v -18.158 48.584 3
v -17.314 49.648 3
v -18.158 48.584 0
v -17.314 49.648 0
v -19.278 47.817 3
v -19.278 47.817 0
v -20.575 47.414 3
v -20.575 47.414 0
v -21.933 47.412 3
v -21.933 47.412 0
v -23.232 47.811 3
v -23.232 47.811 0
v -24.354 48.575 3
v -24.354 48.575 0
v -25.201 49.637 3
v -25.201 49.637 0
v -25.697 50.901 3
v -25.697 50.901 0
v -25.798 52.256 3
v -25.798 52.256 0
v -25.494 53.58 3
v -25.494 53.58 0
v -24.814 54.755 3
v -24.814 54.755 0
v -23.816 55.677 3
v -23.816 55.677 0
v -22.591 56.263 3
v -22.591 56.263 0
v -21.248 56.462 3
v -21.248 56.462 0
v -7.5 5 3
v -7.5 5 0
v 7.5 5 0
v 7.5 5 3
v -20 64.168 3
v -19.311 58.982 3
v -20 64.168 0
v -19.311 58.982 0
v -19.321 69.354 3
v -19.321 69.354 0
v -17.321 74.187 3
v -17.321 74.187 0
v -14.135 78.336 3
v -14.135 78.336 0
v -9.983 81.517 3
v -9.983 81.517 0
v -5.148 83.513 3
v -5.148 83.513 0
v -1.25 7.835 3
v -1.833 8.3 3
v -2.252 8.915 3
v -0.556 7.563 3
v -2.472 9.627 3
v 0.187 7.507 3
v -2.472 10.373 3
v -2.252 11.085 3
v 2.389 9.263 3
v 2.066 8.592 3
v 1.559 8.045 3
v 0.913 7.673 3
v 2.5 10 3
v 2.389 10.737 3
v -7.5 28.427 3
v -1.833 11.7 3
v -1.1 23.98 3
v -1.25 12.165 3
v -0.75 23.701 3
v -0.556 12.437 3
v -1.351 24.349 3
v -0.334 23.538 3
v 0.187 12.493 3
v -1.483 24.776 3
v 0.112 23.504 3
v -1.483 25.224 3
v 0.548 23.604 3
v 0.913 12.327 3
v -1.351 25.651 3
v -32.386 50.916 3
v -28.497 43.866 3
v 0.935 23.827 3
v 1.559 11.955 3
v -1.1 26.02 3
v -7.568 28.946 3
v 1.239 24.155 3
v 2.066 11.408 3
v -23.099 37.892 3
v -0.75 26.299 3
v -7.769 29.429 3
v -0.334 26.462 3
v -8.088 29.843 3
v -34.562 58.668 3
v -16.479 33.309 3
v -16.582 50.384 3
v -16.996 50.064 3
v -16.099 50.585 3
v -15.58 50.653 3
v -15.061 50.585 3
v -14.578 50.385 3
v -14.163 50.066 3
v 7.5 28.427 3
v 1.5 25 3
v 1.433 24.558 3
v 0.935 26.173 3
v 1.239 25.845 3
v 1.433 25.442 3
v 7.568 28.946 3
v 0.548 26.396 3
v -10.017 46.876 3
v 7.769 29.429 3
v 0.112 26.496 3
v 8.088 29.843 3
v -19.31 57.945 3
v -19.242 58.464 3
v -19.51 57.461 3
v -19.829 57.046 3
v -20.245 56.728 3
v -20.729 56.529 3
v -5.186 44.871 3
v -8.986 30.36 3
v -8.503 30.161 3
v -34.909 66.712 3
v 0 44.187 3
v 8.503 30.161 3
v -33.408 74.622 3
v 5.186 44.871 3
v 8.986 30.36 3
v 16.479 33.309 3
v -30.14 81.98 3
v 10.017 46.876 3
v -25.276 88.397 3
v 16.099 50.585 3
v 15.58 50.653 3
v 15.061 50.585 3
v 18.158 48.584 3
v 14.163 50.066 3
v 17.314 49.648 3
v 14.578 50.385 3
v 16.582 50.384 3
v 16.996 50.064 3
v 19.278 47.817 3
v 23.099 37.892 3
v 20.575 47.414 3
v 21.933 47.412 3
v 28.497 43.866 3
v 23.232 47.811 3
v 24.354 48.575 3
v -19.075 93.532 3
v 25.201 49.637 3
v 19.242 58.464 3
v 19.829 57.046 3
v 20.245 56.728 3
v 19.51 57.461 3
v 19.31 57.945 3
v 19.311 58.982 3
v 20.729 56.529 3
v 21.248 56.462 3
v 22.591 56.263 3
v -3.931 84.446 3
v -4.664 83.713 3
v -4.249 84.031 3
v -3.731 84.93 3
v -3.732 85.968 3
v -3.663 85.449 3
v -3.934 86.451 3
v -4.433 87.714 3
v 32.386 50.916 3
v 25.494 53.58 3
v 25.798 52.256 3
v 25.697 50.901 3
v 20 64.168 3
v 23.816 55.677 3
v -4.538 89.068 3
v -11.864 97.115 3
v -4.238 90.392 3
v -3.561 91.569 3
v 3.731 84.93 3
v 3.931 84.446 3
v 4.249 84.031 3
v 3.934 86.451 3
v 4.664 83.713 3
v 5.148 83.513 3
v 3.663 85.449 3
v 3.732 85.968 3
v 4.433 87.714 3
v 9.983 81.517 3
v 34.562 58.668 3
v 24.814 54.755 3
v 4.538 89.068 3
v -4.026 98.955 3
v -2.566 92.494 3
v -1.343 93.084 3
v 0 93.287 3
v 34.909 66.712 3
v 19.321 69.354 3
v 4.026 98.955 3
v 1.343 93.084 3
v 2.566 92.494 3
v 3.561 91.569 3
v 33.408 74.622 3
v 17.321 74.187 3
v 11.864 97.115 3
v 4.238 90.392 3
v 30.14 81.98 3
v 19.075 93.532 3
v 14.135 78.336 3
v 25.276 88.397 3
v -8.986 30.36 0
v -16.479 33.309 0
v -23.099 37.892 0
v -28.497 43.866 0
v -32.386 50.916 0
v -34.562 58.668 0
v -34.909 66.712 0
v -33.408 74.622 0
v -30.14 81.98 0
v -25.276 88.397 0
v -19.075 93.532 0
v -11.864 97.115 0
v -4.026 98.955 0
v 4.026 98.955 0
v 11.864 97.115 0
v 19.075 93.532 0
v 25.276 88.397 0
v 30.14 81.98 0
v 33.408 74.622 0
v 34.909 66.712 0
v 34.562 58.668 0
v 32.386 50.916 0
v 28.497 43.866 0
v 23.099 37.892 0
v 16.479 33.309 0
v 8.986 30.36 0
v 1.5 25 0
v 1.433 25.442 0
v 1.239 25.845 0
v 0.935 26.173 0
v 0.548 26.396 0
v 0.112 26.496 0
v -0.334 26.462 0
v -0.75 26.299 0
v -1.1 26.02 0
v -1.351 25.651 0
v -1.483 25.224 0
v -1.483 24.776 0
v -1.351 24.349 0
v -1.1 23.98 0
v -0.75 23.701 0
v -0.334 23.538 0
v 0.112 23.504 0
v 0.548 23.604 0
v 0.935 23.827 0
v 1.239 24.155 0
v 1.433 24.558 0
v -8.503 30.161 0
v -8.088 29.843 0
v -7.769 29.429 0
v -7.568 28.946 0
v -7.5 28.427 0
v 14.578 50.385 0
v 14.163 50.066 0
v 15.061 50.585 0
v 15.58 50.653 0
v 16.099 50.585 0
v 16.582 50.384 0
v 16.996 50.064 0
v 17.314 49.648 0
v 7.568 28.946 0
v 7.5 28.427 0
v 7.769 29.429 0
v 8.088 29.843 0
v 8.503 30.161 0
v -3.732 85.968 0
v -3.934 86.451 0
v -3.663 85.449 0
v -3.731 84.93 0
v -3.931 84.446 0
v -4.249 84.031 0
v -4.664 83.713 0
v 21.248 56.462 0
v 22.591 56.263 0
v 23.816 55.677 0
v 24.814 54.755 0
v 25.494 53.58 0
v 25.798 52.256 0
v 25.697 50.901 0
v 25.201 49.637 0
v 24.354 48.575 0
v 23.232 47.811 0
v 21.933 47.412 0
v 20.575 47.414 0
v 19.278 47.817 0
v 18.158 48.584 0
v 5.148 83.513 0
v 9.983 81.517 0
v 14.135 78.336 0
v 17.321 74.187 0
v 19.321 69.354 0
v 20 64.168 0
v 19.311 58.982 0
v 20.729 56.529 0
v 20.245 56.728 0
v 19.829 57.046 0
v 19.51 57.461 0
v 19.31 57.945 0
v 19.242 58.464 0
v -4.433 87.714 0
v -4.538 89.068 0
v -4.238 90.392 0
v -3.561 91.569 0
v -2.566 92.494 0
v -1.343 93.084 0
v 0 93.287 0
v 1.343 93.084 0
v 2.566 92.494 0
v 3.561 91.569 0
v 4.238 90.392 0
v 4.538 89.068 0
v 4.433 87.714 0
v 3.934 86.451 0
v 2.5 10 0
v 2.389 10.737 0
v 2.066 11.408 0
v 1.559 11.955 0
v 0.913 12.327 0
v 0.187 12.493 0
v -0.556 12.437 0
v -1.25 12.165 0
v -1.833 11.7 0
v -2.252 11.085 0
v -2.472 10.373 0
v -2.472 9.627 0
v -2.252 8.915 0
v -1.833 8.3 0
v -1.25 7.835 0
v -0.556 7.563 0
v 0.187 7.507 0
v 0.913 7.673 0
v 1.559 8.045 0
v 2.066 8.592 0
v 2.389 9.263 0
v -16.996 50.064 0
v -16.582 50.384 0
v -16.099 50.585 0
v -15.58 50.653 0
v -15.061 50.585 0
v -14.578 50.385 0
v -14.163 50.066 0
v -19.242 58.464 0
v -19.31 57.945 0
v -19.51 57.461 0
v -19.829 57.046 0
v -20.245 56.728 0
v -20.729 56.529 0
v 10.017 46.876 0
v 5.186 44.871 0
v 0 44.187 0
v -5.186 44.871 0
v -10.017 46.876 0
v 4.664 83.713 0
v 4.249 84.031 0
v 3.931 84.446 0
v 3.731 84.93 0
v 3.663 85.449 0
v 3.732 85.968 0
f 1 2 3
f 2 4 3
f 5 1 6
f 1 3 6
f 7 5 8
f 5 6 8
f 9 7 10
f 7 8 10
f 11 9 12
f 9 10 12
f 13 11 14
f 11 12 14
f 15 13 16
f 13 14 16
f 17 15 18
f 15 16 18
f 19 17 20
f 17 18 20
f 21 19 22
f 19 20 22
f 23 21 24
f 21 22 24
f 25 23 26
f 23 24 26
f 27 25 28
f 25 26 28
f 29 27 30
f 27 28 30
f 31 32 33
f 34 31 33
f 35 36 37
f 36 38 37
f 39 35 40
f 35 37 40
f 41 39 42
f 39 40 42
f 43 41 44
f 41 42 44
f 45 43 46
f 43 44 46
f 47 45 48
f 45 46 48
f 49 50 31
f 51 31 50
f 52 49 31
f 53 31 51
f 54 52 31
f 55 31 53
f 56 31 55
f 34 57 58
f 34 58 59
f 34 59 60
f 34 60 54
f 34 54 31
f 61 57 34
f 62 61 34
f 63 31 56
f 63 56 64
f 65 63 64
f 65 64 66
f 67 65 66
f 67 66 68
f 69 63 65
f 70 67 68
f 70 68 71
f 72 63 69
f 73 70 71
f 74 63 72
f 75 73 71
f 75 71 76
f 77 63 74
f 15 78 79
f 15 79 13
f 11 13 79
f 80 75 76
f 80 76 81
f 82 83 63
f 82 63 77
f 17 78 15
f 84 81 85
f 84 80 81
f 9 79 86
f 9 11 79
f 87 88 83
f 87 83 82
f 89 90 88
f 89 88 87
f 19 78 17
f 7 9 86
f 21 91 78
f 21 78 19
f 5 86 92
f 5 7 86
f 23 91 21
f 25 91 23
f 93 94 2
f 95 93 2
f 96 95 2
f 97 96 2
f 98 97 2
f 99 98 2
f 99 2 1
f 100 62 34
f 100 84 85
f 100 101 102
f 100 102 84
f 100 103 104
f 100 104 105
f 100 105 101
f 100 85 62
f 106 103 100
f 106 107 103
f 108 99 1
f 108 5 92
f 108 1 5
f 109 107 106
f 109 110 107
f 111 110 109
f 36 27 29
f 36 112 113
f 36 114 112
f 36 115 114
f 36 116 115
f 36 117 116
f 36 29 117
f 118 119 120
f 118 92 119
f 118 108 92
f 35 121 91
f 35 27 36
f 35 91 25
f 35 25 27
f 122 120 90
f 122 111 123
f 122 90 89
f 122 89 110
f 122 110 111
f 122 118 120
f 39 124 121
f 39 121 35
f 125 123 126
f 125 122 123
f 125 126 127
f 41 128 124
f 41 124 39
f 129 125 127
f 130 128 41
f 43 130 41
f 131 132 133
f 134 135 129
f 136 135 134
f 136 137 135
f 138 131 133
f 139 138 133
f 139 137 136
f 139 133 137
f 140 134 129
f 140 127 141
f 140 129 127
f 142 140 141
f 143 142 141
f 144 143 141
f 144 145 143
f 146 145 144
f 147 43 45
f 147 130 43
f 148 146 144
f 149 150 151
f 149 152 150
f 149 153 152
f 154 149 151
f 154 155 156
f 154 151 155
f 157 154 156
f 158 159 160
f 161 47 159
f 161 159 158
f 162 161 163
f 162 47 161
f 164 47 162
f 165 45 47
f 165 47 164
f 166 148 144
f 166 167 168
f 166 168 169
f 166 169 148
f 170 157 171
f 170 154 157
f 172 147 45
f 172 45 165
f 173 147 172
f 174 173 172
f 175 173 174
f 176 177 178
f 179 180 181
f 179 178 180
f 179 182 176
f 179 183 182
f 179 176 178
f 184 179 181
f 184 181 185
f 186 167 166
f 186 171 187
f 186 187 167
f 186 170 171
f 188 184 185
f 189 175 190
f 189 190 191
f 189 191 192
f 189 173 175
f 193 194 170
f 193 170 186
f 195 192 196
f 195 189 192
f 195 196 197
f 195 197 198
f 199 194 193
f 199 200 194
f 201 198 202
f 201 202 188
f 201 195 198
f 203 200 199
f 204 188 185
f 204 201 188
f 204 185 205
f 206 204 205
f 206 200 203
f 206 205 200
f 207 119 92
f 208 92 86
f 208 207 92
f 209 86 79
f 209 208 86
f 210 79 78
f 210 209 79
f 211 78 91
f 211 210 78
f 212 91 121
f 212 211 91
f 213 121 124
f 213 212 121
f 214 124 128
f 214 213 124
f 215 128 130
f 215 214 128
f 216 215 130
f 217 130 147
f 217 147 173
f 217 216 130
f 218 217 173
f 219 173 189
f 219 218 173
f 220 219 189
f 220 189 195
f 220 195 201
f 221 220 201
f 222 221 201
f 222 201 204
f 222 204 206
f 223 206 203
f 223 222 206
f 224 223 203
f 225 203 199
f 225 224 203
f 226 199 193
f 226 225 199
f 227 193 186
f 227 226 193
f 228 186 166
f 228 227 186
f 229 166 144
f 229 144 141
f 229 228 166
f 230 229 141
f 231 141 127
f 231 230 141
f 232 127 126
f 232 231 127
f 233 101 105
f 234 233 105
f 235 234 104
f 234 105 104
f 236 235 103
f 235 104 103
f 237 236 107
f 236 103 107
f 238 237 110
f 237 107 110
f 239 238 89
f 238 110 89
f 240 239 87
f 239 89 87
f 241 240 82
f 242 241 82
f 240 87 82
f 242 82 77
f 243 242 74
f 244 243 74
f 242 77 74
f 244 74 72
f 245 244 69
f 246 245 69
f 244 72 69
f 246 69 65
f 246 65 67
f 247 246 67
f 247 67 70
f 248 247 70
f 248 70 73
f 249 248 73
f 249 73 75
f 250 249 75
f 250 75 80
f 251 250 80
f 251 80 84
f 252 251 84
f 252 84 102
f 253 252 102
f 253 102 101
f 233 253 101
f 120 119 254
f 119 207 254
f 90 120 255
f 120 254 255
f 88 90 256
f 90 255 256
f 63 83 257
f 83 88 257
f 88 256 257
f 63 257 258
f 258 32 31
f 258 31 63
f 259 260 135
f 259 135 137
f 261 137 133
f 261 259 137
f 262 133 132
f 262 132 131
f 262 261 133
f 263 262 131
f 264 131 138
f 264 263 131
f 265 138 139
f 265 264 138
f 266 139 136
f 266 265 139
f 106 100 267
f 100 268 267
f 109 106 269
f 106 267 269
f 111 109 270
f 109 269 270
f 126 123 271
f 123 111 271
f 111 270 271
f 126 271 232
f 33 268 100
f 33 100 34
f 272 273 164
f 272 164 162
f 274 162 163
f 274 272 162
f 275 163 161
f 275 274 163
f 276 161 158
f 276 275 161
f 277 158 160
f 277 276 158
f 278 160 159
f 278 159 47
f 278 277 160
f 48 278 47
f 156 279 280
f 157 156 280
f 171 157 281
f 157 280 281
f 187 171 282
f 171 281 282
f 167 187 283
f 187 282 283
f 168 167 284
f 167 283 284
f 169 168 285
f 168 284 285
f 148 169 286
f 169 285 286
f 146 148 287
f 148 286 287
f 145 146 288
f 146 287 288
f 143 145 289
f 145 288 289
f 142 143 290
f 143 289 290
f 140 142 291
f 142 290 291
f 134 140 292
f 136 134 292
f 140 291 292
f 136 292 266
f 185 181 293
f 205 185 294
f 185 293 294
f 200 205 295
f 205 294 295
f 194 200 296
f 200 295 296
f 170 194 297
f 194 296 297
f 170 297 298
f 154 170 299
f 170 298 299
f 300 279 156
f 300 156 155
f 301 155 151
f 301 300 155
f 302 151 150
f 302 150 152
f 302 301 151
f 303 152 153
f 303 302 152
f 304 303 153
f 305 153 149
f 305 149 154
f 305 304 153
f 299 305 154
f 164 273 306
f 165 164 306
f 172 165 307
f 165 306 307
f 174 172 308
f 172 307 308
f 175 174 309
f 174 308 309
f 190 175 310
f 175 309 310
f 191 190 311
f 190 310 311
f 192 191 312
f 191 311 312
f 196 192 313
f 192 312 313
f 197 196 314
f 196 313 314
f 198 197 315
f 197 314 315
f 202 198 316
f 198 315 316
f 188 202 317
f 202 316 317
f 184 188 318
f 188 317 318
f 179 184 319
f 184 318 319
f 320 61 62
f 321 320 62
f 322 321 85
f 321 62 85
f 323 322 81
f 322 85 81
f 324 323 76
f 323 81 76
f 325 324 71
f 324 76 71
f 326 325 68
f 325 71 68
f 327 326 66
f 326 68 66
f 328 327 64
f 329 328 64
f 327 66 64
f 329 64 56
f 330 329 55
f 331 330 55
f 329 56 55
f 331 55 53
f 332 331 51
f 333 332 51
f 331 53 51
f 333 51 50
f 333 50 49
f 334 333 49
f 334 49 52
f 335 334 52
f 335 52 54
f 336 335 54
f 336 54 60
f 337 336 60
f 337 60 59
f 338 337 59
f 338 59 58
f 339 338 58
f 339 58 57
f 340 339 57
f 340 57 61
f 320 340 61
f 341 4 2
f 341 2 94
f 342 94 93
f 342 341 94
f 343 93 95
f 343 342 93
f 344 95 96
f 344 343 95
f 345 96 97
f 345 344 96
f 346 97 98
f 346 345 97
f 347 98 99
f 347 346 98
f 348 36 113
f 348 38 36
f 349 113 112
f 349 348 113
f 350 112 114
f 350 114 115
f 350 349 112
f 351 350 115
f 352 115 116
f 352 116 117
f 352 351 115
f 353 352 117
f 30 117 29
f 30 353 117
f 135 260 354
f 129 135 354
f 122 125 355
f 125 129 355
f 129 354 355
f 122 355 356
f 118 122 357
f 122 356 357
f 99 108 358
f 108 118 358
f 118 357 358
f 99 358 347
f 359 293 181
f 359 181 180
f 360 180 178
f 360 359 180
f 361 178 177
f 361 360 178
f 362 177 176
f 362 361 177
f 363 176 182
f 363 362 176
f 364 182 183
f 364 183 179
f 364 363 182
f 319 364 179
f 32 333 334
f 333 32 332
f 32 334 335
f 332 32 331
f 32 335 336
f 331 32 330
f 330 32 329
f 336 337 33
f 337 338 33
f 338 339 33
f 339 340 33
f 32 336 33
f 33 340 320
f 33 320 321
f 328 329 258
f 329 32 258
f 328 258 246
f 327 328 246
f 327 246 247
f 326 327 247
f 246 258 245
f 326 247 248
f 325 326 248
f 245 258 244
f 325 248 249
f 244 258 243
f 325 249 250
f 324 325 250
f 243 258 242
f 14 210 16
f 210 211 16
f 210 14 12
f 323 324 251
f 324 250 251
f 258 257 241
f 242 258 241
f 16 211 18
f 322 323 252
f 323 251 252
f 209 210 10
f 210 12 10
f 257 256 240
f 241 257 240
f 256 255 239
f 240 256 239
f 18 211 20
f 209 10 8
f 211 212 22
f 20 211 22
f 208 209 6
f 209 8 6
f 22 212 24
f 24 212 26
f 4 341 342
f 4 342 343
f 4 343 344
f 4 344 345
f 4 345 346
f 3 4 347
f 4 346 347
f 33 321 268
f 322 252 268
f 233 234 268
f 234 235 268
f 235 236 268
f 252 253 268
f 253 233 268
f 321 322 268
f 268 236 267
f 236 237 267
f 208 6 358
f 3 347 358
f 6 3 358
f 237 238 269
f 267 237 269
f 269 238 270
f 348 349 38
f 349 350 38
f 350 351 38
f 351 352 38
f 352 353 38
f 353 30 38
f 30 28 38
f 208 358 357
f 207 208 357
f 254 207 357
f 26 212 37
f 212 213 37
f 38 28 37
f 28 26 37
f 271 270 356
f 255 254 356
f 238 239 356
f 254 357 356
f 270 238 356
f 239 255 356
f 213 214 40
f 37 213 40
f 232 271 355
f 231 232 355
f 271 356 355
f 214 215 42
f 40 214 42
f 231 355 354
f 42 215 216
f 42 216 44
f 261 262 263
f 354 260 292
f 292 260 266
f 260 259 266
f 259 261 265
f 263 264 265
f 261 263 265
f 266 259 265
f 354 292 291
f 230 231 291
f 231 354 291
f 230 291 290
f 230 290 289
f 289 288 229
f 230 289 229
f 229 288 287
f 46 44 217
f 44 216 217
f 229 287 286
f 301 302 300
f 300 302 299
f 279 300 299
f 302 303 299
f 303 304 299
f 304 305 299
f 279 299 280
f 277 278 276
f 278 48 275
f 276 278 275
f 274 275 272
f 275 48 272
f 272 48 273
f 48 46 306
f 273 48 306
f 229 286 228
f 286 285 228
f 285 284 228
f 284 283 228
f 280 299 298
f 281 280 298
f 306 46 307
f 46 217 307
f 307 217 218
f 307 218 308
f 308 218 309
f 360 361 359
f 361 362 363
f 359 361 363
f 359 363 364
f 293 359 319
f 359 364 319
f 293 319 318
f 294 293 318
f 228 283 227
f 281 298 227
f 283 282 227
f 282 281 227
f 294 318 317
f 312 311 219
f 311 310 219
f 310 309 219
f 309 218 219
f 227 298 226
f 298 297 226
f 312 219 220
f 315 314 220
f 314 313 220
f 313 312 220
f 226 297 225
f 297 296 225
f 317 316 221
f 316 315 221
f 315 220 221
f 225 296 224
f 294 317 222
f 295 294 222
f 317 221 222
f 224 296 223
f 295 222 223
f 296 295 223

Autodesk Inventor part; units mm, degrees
ref_plane "YZ Plane" through (0, 0, 0) normal (1, 0, 0) x (0, 1, 0)
ref_plane "XZ Plane" through (0, 0, 0) normal (0, 1, 0) x (-1, 0, 0)
ref_plane "XY Plane" through (0, 0, 0) normal (0, 0, 1) x (1, 0, 0)
sketch "Эскиз1" plane through (0, 0, 0) normal (0, 0, 1) x (1, 0, 0)
  line L0 (17.5, 5) -> (-17.5, 5) construction
  line L1 (-17.5, 5) -> (-17.5, -5) construction
  line L2 (-17.5, -5) -> (17.5, -5) construction
  line L3 (17.5, -5) -> (17.5, 5) construction
  line L4 (17.5, 5) -> (-17.5, -5) construction
  line L5 (-17.5, 5) -> (17.5, -5) construction
  line L6 (12.8471, 5) -> (-11.1661, 5) construction
  circle A0 centre (0, 64.187) radius 35
  circle A1 centre (0, 64.187) radius 20
  line L7 (0, 64.187) -> (0, 0) construction
  circle A2 centre (0, 88.737) radius 4.55
  line L8 (-7.5, 5) -> (-7.5, 30)
  line L9 (7.5, 30) -> (7.5, 5)
  line L10 (-2, 49.2906) -> (2, 49.2906) construction
  line L11 (-7.5, 5) -> (7.5, 5)
  line L12 (-2, 85.687) -> (2, 85.687)
  line L13 (2, 85.687) -> (2, 82.687)
  line L14 (2, 82.687) -> (-2, 82.687)
  line L15 (-2, 82.687) -> (-2, 85.687)
  line L16 (-2, 85.687) -> (2, 82.687) construction
  line L17 (2, 85.687) -> (-2, 82.687) construction
  line L18 (-17.6195, 51.7049) -> (-19.6195, 55.169)
  circle A3 centre (-21.2609, 51.912) radius 4.55
  line L19 (-17.0215, 56.669) -> (-15.0215, 53.2049)
  line L20 (-19.6195, 55.169) -> (-17.0215, 56.669)
  line L21 (-15.0215, 53.2049) -> (-17.6195, 51.7049)
  line L22 (19.6195, 55.169) -> (17.6195, 51.7049)
  circle A4 centre (21.2609, 51.912) radius 4.55
  line L23 (15.0215, 53.2049) -> (17.0215, 56.669)
  line L24 (17.6195, 51.7049) -> (15.0215, 53.2049)
  line L25 (17.0215, 56.669) -> (19.6195, 55.169)
  point P0 (0, 89.2906)
  point P1 (0, 84.187)
  point P2 (-17.3205, 54.187)
  point P3 (17.3205, 54.187)
  point P4 (18.2337, 55.9692)
  point P5 (18.7216, 55.6875)
  point P6 (16.7216, 52.2234)
  point P7 (16.2337, 52.5051)
  point P8 (-16.2337, 52.5051)
  point P9 (-16.7216, 52.2234)
  point P10 (-18.7216, 55.6875)
  point P11 (-18.2337, 55.9692)
  point P12 (-2, 84.0867)
  point P13 (-2, 84.6501)
  point P14 (2, 84.6501)
  point P15 (2, 84.0867)
  dimension "d3" = 40
  dimension "d4" = 9.1
  dimension "d0" = 70
  dimension "d9" = 35
  dimension "d10" = 25
  dimension "d11" = 10
  dimension "d12" = 15
  dimension "d14" = 7.5
  dimension "d30" = 4
  dimension "d31" = 3
  dimension "d34" = 360
extrude "Выдавливание1" add sketch "Эскиз1" along normal blind 3
fillet "Сопряжение1" radius 2 14 edges at (-7.5, 30, 1.5) (7.5, 30, 1.5) (-18.2337, 55.9692, 1.5) (-18.7216, 55.6875, 1.5) (-16.2337, 52.5051, 1.5) (-16.7216, 52.2234, 1.5) (-2, 84.0867, 1.5) (-2, 84.6501, 1.5) (2, 84.0867, 1.5) (2, 84.6501, 1.5) (18.7216, 55.6875, 1.5) (18.2337, 55.9692, 1.5) (16.7216, 52.2234, 1.5) (16.2337, 52.5051, 1.5)
sketch "Эскиз2" plane through (0, 0, 3) normal (0, 0, 1) x (1, 0, 0)
  circle A0 centre (0, 25) radius 1.5
  circle A1 centre (0, 10) radius 2.5
  line L0 (0, 0) -> (0, 43.9437)
  line L1 (0, 10) -> (0, 5)
  line L2 (-7.5, 5) -> (7.5, 5) projected
  dimension "d24" = 15
  dimension "d25" = 5
  dimension "d26" = 5
  dimension "d27" = 3
extrude "Выдавливание2" cut sketch "Эскиз2" against normal blind 4
properties part number "Деталь1_мозговорот"
